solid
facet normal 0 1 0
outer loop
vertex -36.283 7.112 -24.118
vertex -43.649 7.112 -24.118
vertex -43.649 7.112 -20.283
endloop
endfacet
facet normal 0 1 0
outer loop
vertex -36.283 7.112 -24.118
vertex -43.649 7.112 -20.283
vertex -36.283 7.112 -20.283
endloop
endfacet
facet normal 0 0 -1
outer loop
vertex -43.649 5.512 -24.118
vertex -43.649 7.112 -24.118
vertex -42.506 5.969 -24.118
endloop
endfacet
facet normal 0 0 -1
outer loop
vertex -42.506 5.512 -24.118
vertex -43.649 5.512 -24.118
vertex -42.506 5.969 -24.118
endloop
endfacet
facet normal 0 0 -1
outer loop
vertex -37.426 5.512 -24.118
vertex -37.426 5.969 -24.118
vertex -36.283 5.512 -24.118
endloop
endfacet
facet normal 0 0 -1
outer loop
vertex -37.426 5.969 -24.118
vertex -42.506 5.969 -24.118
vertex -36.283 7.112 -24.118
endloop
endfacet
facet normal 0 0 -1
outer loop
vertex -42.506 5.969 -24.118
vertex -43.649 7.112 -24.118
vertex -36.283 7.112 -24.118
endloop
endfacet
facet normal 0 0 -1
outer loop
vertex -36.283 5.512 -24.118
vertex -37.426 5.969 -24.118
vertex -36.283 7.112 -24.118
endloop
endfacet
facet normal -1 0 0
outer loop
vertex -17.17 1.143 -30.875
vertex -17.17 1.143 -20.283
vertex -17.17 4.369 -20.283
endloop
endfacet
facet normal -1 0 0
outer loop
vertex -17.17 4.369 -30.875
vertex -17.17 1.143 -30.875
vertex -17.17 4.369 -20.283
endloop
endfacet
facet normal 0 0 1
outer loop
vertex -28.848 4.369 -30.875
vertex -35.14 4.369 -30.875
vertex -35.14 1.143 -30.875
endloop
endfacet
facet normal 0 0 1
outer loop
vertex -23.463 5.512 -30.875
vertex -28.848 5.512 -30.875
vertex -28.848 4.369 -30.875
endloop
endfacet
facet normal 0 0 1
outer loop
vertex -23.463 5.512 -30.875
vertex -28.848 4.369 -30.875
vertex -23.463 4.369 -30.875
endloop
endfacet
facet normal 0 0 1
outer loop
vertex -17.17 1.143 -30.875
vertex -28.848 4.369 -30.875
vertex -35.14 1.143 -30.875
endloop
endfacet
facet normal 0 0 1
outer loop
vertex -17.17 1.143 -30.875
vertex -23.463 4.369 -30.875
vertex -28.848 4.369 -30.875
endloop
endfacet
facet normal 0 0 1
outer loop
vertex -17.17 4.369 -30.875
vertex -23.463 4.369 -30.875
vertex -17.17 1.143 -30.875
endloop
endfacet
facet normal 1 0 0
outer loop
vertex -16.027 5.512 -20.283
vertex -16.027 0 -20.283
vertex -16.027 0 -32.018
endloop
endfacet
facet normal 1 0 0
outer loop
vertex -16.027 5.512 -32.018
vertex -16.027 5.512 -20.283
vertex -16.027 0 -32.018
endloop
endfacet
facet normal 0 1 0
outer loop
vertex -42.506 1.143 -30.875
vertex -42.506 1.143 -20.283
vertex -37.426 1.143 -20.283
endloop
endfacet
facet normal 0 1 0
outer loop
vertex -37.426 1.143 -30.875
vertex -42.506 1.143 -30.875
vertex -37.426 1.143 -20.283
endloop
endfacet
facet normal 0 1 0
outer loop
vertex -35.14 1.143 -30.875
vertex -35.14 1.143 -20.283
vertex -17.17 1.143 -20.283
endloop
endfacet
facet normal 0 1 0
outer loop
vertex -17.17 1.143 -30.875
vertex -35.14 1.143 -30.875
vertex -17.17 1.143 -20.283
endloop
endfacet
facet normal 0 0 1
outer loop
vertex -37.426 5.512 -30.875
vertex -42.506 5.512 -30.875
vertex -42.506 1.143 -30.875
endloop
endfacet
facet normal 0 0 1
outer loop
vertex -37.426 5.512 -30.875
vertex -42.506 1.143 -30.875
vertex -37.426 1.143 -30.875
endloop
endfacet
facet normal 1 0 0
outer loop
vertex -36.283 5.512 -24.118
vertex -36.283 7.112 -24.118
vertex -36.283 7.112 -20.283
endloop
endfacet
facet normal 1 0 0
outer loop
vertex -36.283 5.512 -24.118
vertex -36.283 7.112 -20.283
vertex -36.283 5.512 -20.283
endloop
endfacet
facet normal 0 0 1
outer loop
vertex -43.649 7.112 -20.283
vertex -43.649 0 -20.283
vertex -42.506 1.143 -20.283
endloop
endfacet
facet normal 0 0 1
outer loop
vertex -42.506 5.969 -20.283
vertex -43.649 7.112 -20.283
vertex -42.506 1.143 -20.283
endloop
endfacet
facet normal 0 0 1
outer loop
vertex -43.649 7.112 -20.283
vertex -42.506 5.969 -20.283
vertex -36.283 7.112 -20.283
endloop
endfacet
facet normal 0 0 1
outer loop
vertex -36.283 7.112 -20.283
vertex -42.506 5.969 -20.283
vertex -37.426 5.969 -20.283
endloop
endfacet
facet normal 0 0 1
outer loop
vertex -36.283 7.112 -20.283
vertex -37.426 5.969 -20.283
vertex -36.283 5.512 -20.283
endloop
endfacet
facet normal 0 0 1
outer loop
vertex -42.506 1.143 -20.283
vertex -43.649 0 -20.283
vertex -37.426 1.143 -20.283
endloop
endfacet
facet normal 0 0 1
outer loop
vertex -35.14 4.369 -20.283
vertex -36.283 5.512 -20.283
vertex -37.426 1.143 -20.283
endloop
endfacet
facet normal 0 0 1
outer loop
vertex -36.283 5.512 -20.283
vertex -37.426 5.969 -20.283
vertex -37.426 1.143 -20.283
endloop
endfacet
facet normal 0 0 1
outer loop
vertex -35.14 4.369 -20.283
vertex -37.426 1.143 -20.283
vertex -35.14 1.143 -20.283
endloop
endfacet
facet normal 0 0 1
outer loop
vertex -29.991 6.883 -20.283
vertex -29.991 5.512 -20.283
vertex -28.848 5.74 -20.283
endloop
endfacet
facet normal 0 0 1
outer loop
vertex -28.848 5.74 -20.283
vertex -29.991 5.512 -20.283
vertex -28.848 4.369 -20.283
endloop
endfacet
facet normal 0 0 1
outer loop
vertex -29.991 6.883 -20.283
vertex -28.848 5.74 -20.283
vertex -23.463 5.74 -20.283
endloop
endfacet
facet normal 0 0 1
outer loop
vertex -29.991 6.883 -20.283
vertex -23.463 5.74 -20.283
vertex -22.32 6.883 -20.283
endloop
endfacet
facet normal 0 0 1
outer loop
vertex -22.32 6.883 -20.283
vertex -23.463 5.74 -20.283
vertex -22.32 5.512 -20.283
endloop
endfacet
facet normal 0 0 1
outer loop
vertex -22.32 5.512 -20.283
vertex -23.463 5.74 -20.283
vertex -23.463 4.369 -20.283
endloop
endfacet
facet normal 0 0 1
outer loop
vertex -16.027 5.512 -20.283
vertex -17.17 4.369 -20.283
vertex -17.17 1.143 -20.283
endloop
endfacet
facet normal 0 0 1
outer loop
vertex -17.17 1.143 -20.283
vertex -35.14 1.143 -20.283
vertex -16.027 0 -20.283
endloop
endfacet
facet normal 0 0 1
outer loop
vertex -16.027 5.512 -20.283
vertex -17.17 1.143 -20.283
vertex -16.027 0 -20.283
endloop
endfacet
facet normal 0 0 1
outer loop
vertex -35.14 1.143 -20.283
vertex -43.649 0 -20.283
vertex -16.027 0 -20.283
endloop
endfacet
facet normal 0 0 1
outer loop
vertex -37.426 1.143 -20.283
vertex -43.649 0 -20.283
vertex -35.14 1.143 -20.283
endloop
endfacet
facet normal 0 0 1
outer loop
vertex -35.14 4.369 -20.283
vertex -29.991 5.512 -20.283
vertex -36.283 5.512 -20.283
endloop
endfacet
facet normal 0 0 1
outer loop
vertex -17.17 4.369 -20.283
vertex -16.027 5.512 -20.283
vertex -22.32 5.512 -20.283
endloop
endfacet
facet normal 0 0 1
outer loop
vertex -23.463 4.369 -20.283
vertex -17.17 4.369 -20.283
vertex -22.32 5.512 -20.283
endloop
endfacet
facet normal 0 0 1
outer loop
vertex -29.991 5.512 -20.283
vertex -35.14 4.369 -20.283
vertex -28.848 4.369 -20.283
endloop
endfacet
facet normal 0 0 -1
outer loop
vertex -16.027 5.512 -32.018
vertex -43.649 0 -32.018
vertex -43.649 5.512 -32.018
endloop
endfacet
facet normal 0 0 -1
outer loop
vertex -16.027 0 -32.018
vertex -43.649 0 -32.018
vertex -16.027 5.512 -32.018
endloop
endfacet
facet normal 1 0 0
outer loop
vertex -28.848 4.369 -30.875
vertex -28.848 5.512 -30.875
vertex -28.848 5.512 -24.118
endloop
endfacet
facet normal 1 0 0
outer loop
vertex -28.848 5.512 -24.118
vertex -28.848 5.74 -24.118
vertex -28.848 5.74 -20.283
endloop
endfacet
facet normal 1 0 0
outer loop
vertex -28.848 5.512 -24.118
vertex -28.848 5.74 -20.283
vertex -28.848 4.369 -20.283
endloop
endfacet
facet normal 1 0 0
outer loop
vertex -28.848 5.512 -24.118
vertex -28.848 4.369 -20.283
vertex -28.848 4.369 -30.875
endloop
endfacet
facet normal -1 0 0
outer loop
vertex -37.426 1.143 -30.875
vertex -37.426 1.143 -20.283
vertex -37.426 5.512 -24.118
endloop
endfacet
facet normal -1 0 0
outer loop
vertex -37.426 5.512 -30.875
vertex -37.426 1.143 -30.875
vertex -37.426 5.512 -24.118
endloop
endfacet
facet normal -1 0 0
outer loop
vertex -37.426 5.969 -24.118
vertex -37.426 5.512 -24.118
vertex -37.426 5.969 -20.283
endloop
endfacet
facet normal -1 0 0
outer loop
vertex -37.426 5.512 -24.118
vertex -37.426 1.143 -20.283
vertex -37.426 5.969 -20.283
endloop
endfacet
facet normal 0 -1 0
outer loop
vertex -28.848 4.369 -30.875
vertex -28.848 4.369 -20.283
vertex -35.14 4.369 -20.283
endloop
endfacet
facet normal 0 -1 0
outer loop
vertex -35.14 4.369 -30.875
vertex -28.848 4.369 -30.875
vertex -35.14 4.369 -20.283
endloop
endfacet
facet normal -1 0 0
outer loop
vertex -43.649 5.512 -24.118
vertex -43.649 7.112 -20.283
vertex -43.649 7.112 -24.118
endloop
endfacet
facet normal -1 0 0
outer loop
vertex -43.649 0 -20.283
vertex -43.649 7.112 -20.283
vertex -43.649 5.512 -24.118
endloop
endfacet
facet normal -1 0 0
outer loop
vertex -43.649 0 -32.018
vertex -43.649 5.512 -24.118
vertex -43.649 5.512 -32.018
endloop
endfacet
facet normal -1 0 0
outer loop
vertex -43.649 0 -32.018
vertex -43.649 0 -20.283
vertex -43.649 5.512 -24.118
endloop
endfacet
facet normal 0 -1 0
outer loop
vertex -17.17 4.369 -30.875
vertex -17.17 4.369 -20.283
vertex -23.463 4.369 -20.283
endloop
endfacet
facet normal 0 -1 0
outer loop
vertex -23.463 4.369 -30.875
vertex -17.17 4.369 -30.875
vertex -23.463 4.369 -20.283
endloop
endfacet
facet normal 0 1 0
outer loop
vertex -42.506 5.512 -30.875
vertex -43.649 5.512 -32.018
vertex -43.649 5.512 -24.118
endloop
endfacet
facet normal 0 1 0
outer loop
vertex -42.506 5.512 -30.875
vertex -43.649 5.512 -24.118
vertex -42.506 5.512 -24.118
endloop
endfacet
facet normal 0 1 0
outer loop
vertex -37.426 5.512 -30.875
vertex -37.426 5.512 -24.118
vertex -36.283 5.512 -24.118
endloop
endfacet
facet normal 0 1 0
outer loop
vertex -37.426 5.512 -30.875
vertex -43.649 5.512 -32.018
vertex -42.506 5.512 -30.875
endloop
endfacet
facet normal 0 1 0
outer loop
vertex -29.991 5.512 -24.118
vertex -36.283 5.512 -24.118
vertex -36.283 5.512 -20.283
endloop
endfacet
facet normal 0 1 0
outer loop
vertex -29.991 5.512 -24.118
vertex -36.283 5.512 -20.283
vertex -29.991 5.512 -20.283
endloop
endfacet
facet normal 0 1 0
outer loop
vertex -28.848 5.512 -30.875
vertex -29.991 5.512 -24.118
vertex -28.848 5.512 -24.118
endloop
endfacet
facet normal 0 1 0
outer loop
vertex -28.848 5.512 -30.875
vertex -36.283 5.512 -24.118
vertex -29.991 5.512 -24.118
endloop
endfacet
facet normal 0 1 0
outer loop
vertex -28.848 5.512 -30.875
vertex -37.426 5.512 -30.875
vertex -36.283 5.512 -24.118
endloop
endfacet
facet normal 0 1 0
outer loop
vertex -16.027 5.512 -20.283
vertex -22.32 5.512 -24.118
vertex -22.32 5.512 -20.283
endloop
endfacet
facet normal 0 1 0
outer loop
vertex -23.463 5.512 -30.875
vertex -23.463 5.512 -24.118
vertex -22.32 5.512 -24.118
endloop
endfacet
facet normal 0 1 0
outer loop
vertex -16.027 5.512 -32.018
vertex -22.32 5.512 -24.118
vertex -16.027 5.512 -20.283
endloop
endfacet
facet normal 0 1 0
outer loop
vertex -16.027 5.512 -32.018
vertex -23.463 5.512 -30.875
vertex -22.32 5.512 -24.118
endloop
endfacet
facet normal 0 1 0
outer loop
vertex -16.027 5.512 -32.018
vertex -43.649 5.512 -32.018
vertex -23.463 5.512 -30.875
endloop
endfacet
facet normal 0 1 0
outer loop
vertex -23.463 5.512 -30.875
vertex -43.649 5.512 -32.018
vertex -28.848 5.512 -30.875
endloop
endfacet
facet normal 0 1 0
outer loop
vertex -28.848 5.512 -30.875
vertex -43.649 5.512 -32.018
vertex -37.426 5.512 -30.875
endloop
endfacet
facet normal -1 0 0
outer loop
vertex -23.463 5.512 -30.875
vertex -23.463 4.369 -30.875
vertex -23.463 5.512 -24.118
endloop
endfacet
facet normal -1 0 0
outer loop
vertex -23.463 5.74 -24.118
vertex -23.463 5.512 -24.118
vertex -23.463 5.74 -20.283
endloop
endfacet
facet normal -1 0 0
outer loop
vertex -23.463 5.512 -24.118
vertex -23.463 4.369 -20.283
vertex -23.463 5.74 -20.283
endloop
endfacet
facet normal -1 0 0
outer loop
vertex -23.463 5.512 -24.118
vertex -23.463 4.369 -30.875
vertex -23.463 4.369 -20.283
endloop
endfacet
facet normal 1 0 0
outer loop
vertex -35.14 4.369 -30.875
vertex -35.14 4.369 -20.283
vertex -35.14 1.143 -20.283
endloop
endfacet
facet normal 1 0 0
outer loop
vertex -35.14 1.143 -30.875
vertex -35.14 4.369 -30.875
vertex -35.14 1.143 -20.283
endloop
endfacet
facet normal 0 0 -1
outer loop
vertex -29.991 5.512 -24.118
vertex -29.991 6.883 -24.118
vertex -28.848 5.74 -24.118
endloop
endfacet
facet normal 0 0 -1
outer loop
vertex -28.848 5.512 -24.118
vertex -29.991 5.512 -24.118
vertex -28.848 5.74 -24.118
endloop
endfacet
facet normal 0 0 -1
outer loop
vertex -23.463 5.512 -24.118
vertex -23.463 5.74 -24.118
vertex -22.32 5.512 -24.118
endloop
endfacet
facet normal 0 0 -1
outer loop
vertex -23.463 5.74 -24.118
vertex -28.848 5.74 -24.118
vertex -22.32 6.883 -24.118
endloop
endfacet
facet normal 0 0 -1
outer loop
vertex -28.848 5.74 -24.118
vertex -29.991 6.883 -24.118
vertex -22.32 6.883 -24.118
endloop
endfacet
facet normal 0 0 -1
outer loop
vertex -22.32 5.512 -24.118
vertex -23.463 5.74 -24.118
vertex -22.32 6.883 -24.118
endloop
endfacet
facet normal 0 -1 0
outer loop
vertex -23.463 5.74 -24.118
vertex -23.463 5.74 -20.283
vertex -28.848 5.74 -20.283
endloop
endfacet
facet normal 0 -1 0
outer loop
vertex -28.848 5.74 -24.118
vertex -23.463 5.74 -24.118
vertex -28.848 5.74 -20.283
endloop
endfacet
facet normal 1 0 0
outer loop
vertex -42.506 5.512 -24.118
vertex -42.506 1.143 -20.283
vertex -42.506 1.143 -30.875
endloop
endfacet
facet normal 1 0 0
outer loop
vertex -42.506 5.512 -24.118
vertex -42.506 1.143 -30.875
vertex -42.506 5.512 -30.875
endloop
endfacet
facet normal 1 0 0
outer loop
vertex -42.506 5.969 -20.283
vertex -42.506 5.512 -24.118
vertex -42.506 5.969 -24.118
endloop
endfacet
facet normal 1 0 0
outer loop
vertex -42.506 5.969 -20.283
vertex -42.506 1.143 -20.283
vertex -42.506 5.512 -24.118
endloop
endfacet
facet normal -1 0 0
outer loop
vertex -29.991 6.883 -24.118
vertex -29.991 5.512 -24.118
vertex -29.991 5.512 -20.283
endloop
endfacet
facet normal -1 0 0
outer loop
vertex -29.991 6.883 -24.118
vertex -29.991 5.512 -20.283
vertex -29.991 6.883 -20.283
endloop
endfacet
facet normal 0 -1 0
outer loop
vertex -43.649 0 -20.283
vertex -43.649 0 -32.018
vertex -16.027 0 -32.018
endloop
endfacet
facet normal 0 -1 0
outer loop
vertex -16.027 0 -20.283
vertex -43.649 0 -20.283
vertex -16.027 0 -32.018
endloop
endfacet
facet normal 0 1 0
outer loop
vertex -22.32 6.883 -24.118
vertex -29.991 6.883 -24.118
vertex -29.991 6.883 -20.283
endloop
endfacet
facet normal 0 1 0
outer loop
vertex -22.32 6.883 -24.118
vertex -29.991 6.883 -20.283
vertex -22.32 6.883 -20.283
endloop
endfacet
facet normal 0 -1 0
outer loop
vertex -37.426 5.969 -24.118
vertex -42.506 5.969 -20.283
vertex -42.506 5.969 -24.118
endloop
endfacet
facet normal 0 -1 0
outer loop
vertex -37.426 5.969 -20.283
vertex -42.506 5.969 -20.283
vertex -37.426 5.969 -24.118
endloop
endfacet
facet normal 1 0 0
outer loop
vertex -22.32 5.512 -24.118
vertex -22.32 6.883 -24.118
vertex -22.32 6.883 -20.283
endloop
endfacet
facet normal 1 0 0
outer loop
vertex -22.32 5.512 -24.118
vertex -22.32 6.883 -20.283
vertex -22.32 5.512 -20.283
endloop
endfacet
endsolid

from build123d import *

# Parameters (mm, degrees)
SKETCH1_W               = 27.6225
SKETCH1_H               = 11.7348
BOSS_EXTRUDE1_DEPTH     = 7.112
CUT_EXTRUDE1_DEPTH      = 46.755458387
CUT_EXTRUDE1_DEPTH_BACK = 46.755458387
SKETCH3_W               = 5.08
SKETCH3_H               = 4.826
CUT_EXTRUDE2_DEPTH      = 10.5918
CUT_EXTRUDE3_REACH      = 56.598
SKETCH4_W               = 21.32965
SKETCH4_H               = 7.8994


with BuildPart() as part:
    # Sketch1 → Boss-Extrude1 (new body)
    with BuildSketch(Plane(origin=(0, 0, 0), x_dir=(1, 0, 0), z_dir=(0, 1, 0))):
        with Locations((-29.838216172, 26.150202934)):
            Rectangle(SKETCH1_W, SKETCH1_H)
    extrude(amount=BOSS_EXTRUDE1_DEPTH)

    # Sketch2 → Cut-Extrude1 (cut, two sides: drawn at the far end of the back side and taken through both)
    with BuildSketch(Plane.XY.offset(-20.282802934).offset(-CUT_EXTRUDE1_DEPTH_BACK)):
        Polygon((-36.283466172, 73.446090762), (-36.283466172, 7.112), (-36.283466172, 5.5118), (-29.990616172, 5.5118), (-29.990616172, 6.8834), (-22.319816172, 6.8834), (-22.319816172, 5.5118), (-16.026966172, 5.5118), (50.307124589, 5.5118), (132.196959284, 109.890444188), (45.606368522, 177.82473495), align=None)
    extrude(amount=CUT_EXTRUDE1_DEPTH + CUT_EXTRUDE1_DEPTH_BACK, mode=Mode.SUBTRACT)

    # Sketch3 → Cut-Extrude2 (cut)
    with BuildSketch(Plane.XY.offset(-20.282802934)):
        with Locations((-39.966466172, 3.556)):
            Rectangle(SKETCH3_W, SKETCH3_H)
        Polygon((-35.140466172, 4.3688), (-35.140466172, 1.143), (-17.169966172, 1.143), (-17.169966172, 4.3688), (-23.462816172, 4.3688), (-23.462816172, 5.7404), (-28.847616172, 5.7404), (-28.847616172, 4.3688), align=None)
    extrude(amount=-CUT_EXTRUDE2_DEPTH, mode=Mode.SUBTRACT)

    # Cut-Extrude3: up to this face of the body (flat: up to its plane)
    cut_extrude3_end = Plane(part.part.faces().sort_by_distance((-33.137041172, 5.5118, -26.150202934))[0])
    # Sketch4 → Cut-Extrude3 (cut, up to the picked face)
    with BuildSketch(Plane(origin=(0, 7.112, 0), x_dir=(1, 0, 0), z_dir=(0, 1, 0)), mode=Mode.PRIVATE) as cut_extrude3_sk1:
        with Locations((-32.984641172, 28.067902934)):
            Rectangle(SKETCH4_W, SKETCH4_H)
    cut_extrude3_tool1 = split(extrude(cut_extrude3_sk1.sketch, amount=-CUT_EXTRUDE3_REACH, mode=Mode.PRIVATE), bisect_by=cut_extrude3_end, keep=Keep.BOTH, mode=Mode.PRIVATE)
    add(cut_extrude3_tool1.solids().sort_by(Axis((-32.984641, 7.112, -28.067903), (0, -1, 0)))[0], mode=Mode.SUBTRACT)


solid = part.part
